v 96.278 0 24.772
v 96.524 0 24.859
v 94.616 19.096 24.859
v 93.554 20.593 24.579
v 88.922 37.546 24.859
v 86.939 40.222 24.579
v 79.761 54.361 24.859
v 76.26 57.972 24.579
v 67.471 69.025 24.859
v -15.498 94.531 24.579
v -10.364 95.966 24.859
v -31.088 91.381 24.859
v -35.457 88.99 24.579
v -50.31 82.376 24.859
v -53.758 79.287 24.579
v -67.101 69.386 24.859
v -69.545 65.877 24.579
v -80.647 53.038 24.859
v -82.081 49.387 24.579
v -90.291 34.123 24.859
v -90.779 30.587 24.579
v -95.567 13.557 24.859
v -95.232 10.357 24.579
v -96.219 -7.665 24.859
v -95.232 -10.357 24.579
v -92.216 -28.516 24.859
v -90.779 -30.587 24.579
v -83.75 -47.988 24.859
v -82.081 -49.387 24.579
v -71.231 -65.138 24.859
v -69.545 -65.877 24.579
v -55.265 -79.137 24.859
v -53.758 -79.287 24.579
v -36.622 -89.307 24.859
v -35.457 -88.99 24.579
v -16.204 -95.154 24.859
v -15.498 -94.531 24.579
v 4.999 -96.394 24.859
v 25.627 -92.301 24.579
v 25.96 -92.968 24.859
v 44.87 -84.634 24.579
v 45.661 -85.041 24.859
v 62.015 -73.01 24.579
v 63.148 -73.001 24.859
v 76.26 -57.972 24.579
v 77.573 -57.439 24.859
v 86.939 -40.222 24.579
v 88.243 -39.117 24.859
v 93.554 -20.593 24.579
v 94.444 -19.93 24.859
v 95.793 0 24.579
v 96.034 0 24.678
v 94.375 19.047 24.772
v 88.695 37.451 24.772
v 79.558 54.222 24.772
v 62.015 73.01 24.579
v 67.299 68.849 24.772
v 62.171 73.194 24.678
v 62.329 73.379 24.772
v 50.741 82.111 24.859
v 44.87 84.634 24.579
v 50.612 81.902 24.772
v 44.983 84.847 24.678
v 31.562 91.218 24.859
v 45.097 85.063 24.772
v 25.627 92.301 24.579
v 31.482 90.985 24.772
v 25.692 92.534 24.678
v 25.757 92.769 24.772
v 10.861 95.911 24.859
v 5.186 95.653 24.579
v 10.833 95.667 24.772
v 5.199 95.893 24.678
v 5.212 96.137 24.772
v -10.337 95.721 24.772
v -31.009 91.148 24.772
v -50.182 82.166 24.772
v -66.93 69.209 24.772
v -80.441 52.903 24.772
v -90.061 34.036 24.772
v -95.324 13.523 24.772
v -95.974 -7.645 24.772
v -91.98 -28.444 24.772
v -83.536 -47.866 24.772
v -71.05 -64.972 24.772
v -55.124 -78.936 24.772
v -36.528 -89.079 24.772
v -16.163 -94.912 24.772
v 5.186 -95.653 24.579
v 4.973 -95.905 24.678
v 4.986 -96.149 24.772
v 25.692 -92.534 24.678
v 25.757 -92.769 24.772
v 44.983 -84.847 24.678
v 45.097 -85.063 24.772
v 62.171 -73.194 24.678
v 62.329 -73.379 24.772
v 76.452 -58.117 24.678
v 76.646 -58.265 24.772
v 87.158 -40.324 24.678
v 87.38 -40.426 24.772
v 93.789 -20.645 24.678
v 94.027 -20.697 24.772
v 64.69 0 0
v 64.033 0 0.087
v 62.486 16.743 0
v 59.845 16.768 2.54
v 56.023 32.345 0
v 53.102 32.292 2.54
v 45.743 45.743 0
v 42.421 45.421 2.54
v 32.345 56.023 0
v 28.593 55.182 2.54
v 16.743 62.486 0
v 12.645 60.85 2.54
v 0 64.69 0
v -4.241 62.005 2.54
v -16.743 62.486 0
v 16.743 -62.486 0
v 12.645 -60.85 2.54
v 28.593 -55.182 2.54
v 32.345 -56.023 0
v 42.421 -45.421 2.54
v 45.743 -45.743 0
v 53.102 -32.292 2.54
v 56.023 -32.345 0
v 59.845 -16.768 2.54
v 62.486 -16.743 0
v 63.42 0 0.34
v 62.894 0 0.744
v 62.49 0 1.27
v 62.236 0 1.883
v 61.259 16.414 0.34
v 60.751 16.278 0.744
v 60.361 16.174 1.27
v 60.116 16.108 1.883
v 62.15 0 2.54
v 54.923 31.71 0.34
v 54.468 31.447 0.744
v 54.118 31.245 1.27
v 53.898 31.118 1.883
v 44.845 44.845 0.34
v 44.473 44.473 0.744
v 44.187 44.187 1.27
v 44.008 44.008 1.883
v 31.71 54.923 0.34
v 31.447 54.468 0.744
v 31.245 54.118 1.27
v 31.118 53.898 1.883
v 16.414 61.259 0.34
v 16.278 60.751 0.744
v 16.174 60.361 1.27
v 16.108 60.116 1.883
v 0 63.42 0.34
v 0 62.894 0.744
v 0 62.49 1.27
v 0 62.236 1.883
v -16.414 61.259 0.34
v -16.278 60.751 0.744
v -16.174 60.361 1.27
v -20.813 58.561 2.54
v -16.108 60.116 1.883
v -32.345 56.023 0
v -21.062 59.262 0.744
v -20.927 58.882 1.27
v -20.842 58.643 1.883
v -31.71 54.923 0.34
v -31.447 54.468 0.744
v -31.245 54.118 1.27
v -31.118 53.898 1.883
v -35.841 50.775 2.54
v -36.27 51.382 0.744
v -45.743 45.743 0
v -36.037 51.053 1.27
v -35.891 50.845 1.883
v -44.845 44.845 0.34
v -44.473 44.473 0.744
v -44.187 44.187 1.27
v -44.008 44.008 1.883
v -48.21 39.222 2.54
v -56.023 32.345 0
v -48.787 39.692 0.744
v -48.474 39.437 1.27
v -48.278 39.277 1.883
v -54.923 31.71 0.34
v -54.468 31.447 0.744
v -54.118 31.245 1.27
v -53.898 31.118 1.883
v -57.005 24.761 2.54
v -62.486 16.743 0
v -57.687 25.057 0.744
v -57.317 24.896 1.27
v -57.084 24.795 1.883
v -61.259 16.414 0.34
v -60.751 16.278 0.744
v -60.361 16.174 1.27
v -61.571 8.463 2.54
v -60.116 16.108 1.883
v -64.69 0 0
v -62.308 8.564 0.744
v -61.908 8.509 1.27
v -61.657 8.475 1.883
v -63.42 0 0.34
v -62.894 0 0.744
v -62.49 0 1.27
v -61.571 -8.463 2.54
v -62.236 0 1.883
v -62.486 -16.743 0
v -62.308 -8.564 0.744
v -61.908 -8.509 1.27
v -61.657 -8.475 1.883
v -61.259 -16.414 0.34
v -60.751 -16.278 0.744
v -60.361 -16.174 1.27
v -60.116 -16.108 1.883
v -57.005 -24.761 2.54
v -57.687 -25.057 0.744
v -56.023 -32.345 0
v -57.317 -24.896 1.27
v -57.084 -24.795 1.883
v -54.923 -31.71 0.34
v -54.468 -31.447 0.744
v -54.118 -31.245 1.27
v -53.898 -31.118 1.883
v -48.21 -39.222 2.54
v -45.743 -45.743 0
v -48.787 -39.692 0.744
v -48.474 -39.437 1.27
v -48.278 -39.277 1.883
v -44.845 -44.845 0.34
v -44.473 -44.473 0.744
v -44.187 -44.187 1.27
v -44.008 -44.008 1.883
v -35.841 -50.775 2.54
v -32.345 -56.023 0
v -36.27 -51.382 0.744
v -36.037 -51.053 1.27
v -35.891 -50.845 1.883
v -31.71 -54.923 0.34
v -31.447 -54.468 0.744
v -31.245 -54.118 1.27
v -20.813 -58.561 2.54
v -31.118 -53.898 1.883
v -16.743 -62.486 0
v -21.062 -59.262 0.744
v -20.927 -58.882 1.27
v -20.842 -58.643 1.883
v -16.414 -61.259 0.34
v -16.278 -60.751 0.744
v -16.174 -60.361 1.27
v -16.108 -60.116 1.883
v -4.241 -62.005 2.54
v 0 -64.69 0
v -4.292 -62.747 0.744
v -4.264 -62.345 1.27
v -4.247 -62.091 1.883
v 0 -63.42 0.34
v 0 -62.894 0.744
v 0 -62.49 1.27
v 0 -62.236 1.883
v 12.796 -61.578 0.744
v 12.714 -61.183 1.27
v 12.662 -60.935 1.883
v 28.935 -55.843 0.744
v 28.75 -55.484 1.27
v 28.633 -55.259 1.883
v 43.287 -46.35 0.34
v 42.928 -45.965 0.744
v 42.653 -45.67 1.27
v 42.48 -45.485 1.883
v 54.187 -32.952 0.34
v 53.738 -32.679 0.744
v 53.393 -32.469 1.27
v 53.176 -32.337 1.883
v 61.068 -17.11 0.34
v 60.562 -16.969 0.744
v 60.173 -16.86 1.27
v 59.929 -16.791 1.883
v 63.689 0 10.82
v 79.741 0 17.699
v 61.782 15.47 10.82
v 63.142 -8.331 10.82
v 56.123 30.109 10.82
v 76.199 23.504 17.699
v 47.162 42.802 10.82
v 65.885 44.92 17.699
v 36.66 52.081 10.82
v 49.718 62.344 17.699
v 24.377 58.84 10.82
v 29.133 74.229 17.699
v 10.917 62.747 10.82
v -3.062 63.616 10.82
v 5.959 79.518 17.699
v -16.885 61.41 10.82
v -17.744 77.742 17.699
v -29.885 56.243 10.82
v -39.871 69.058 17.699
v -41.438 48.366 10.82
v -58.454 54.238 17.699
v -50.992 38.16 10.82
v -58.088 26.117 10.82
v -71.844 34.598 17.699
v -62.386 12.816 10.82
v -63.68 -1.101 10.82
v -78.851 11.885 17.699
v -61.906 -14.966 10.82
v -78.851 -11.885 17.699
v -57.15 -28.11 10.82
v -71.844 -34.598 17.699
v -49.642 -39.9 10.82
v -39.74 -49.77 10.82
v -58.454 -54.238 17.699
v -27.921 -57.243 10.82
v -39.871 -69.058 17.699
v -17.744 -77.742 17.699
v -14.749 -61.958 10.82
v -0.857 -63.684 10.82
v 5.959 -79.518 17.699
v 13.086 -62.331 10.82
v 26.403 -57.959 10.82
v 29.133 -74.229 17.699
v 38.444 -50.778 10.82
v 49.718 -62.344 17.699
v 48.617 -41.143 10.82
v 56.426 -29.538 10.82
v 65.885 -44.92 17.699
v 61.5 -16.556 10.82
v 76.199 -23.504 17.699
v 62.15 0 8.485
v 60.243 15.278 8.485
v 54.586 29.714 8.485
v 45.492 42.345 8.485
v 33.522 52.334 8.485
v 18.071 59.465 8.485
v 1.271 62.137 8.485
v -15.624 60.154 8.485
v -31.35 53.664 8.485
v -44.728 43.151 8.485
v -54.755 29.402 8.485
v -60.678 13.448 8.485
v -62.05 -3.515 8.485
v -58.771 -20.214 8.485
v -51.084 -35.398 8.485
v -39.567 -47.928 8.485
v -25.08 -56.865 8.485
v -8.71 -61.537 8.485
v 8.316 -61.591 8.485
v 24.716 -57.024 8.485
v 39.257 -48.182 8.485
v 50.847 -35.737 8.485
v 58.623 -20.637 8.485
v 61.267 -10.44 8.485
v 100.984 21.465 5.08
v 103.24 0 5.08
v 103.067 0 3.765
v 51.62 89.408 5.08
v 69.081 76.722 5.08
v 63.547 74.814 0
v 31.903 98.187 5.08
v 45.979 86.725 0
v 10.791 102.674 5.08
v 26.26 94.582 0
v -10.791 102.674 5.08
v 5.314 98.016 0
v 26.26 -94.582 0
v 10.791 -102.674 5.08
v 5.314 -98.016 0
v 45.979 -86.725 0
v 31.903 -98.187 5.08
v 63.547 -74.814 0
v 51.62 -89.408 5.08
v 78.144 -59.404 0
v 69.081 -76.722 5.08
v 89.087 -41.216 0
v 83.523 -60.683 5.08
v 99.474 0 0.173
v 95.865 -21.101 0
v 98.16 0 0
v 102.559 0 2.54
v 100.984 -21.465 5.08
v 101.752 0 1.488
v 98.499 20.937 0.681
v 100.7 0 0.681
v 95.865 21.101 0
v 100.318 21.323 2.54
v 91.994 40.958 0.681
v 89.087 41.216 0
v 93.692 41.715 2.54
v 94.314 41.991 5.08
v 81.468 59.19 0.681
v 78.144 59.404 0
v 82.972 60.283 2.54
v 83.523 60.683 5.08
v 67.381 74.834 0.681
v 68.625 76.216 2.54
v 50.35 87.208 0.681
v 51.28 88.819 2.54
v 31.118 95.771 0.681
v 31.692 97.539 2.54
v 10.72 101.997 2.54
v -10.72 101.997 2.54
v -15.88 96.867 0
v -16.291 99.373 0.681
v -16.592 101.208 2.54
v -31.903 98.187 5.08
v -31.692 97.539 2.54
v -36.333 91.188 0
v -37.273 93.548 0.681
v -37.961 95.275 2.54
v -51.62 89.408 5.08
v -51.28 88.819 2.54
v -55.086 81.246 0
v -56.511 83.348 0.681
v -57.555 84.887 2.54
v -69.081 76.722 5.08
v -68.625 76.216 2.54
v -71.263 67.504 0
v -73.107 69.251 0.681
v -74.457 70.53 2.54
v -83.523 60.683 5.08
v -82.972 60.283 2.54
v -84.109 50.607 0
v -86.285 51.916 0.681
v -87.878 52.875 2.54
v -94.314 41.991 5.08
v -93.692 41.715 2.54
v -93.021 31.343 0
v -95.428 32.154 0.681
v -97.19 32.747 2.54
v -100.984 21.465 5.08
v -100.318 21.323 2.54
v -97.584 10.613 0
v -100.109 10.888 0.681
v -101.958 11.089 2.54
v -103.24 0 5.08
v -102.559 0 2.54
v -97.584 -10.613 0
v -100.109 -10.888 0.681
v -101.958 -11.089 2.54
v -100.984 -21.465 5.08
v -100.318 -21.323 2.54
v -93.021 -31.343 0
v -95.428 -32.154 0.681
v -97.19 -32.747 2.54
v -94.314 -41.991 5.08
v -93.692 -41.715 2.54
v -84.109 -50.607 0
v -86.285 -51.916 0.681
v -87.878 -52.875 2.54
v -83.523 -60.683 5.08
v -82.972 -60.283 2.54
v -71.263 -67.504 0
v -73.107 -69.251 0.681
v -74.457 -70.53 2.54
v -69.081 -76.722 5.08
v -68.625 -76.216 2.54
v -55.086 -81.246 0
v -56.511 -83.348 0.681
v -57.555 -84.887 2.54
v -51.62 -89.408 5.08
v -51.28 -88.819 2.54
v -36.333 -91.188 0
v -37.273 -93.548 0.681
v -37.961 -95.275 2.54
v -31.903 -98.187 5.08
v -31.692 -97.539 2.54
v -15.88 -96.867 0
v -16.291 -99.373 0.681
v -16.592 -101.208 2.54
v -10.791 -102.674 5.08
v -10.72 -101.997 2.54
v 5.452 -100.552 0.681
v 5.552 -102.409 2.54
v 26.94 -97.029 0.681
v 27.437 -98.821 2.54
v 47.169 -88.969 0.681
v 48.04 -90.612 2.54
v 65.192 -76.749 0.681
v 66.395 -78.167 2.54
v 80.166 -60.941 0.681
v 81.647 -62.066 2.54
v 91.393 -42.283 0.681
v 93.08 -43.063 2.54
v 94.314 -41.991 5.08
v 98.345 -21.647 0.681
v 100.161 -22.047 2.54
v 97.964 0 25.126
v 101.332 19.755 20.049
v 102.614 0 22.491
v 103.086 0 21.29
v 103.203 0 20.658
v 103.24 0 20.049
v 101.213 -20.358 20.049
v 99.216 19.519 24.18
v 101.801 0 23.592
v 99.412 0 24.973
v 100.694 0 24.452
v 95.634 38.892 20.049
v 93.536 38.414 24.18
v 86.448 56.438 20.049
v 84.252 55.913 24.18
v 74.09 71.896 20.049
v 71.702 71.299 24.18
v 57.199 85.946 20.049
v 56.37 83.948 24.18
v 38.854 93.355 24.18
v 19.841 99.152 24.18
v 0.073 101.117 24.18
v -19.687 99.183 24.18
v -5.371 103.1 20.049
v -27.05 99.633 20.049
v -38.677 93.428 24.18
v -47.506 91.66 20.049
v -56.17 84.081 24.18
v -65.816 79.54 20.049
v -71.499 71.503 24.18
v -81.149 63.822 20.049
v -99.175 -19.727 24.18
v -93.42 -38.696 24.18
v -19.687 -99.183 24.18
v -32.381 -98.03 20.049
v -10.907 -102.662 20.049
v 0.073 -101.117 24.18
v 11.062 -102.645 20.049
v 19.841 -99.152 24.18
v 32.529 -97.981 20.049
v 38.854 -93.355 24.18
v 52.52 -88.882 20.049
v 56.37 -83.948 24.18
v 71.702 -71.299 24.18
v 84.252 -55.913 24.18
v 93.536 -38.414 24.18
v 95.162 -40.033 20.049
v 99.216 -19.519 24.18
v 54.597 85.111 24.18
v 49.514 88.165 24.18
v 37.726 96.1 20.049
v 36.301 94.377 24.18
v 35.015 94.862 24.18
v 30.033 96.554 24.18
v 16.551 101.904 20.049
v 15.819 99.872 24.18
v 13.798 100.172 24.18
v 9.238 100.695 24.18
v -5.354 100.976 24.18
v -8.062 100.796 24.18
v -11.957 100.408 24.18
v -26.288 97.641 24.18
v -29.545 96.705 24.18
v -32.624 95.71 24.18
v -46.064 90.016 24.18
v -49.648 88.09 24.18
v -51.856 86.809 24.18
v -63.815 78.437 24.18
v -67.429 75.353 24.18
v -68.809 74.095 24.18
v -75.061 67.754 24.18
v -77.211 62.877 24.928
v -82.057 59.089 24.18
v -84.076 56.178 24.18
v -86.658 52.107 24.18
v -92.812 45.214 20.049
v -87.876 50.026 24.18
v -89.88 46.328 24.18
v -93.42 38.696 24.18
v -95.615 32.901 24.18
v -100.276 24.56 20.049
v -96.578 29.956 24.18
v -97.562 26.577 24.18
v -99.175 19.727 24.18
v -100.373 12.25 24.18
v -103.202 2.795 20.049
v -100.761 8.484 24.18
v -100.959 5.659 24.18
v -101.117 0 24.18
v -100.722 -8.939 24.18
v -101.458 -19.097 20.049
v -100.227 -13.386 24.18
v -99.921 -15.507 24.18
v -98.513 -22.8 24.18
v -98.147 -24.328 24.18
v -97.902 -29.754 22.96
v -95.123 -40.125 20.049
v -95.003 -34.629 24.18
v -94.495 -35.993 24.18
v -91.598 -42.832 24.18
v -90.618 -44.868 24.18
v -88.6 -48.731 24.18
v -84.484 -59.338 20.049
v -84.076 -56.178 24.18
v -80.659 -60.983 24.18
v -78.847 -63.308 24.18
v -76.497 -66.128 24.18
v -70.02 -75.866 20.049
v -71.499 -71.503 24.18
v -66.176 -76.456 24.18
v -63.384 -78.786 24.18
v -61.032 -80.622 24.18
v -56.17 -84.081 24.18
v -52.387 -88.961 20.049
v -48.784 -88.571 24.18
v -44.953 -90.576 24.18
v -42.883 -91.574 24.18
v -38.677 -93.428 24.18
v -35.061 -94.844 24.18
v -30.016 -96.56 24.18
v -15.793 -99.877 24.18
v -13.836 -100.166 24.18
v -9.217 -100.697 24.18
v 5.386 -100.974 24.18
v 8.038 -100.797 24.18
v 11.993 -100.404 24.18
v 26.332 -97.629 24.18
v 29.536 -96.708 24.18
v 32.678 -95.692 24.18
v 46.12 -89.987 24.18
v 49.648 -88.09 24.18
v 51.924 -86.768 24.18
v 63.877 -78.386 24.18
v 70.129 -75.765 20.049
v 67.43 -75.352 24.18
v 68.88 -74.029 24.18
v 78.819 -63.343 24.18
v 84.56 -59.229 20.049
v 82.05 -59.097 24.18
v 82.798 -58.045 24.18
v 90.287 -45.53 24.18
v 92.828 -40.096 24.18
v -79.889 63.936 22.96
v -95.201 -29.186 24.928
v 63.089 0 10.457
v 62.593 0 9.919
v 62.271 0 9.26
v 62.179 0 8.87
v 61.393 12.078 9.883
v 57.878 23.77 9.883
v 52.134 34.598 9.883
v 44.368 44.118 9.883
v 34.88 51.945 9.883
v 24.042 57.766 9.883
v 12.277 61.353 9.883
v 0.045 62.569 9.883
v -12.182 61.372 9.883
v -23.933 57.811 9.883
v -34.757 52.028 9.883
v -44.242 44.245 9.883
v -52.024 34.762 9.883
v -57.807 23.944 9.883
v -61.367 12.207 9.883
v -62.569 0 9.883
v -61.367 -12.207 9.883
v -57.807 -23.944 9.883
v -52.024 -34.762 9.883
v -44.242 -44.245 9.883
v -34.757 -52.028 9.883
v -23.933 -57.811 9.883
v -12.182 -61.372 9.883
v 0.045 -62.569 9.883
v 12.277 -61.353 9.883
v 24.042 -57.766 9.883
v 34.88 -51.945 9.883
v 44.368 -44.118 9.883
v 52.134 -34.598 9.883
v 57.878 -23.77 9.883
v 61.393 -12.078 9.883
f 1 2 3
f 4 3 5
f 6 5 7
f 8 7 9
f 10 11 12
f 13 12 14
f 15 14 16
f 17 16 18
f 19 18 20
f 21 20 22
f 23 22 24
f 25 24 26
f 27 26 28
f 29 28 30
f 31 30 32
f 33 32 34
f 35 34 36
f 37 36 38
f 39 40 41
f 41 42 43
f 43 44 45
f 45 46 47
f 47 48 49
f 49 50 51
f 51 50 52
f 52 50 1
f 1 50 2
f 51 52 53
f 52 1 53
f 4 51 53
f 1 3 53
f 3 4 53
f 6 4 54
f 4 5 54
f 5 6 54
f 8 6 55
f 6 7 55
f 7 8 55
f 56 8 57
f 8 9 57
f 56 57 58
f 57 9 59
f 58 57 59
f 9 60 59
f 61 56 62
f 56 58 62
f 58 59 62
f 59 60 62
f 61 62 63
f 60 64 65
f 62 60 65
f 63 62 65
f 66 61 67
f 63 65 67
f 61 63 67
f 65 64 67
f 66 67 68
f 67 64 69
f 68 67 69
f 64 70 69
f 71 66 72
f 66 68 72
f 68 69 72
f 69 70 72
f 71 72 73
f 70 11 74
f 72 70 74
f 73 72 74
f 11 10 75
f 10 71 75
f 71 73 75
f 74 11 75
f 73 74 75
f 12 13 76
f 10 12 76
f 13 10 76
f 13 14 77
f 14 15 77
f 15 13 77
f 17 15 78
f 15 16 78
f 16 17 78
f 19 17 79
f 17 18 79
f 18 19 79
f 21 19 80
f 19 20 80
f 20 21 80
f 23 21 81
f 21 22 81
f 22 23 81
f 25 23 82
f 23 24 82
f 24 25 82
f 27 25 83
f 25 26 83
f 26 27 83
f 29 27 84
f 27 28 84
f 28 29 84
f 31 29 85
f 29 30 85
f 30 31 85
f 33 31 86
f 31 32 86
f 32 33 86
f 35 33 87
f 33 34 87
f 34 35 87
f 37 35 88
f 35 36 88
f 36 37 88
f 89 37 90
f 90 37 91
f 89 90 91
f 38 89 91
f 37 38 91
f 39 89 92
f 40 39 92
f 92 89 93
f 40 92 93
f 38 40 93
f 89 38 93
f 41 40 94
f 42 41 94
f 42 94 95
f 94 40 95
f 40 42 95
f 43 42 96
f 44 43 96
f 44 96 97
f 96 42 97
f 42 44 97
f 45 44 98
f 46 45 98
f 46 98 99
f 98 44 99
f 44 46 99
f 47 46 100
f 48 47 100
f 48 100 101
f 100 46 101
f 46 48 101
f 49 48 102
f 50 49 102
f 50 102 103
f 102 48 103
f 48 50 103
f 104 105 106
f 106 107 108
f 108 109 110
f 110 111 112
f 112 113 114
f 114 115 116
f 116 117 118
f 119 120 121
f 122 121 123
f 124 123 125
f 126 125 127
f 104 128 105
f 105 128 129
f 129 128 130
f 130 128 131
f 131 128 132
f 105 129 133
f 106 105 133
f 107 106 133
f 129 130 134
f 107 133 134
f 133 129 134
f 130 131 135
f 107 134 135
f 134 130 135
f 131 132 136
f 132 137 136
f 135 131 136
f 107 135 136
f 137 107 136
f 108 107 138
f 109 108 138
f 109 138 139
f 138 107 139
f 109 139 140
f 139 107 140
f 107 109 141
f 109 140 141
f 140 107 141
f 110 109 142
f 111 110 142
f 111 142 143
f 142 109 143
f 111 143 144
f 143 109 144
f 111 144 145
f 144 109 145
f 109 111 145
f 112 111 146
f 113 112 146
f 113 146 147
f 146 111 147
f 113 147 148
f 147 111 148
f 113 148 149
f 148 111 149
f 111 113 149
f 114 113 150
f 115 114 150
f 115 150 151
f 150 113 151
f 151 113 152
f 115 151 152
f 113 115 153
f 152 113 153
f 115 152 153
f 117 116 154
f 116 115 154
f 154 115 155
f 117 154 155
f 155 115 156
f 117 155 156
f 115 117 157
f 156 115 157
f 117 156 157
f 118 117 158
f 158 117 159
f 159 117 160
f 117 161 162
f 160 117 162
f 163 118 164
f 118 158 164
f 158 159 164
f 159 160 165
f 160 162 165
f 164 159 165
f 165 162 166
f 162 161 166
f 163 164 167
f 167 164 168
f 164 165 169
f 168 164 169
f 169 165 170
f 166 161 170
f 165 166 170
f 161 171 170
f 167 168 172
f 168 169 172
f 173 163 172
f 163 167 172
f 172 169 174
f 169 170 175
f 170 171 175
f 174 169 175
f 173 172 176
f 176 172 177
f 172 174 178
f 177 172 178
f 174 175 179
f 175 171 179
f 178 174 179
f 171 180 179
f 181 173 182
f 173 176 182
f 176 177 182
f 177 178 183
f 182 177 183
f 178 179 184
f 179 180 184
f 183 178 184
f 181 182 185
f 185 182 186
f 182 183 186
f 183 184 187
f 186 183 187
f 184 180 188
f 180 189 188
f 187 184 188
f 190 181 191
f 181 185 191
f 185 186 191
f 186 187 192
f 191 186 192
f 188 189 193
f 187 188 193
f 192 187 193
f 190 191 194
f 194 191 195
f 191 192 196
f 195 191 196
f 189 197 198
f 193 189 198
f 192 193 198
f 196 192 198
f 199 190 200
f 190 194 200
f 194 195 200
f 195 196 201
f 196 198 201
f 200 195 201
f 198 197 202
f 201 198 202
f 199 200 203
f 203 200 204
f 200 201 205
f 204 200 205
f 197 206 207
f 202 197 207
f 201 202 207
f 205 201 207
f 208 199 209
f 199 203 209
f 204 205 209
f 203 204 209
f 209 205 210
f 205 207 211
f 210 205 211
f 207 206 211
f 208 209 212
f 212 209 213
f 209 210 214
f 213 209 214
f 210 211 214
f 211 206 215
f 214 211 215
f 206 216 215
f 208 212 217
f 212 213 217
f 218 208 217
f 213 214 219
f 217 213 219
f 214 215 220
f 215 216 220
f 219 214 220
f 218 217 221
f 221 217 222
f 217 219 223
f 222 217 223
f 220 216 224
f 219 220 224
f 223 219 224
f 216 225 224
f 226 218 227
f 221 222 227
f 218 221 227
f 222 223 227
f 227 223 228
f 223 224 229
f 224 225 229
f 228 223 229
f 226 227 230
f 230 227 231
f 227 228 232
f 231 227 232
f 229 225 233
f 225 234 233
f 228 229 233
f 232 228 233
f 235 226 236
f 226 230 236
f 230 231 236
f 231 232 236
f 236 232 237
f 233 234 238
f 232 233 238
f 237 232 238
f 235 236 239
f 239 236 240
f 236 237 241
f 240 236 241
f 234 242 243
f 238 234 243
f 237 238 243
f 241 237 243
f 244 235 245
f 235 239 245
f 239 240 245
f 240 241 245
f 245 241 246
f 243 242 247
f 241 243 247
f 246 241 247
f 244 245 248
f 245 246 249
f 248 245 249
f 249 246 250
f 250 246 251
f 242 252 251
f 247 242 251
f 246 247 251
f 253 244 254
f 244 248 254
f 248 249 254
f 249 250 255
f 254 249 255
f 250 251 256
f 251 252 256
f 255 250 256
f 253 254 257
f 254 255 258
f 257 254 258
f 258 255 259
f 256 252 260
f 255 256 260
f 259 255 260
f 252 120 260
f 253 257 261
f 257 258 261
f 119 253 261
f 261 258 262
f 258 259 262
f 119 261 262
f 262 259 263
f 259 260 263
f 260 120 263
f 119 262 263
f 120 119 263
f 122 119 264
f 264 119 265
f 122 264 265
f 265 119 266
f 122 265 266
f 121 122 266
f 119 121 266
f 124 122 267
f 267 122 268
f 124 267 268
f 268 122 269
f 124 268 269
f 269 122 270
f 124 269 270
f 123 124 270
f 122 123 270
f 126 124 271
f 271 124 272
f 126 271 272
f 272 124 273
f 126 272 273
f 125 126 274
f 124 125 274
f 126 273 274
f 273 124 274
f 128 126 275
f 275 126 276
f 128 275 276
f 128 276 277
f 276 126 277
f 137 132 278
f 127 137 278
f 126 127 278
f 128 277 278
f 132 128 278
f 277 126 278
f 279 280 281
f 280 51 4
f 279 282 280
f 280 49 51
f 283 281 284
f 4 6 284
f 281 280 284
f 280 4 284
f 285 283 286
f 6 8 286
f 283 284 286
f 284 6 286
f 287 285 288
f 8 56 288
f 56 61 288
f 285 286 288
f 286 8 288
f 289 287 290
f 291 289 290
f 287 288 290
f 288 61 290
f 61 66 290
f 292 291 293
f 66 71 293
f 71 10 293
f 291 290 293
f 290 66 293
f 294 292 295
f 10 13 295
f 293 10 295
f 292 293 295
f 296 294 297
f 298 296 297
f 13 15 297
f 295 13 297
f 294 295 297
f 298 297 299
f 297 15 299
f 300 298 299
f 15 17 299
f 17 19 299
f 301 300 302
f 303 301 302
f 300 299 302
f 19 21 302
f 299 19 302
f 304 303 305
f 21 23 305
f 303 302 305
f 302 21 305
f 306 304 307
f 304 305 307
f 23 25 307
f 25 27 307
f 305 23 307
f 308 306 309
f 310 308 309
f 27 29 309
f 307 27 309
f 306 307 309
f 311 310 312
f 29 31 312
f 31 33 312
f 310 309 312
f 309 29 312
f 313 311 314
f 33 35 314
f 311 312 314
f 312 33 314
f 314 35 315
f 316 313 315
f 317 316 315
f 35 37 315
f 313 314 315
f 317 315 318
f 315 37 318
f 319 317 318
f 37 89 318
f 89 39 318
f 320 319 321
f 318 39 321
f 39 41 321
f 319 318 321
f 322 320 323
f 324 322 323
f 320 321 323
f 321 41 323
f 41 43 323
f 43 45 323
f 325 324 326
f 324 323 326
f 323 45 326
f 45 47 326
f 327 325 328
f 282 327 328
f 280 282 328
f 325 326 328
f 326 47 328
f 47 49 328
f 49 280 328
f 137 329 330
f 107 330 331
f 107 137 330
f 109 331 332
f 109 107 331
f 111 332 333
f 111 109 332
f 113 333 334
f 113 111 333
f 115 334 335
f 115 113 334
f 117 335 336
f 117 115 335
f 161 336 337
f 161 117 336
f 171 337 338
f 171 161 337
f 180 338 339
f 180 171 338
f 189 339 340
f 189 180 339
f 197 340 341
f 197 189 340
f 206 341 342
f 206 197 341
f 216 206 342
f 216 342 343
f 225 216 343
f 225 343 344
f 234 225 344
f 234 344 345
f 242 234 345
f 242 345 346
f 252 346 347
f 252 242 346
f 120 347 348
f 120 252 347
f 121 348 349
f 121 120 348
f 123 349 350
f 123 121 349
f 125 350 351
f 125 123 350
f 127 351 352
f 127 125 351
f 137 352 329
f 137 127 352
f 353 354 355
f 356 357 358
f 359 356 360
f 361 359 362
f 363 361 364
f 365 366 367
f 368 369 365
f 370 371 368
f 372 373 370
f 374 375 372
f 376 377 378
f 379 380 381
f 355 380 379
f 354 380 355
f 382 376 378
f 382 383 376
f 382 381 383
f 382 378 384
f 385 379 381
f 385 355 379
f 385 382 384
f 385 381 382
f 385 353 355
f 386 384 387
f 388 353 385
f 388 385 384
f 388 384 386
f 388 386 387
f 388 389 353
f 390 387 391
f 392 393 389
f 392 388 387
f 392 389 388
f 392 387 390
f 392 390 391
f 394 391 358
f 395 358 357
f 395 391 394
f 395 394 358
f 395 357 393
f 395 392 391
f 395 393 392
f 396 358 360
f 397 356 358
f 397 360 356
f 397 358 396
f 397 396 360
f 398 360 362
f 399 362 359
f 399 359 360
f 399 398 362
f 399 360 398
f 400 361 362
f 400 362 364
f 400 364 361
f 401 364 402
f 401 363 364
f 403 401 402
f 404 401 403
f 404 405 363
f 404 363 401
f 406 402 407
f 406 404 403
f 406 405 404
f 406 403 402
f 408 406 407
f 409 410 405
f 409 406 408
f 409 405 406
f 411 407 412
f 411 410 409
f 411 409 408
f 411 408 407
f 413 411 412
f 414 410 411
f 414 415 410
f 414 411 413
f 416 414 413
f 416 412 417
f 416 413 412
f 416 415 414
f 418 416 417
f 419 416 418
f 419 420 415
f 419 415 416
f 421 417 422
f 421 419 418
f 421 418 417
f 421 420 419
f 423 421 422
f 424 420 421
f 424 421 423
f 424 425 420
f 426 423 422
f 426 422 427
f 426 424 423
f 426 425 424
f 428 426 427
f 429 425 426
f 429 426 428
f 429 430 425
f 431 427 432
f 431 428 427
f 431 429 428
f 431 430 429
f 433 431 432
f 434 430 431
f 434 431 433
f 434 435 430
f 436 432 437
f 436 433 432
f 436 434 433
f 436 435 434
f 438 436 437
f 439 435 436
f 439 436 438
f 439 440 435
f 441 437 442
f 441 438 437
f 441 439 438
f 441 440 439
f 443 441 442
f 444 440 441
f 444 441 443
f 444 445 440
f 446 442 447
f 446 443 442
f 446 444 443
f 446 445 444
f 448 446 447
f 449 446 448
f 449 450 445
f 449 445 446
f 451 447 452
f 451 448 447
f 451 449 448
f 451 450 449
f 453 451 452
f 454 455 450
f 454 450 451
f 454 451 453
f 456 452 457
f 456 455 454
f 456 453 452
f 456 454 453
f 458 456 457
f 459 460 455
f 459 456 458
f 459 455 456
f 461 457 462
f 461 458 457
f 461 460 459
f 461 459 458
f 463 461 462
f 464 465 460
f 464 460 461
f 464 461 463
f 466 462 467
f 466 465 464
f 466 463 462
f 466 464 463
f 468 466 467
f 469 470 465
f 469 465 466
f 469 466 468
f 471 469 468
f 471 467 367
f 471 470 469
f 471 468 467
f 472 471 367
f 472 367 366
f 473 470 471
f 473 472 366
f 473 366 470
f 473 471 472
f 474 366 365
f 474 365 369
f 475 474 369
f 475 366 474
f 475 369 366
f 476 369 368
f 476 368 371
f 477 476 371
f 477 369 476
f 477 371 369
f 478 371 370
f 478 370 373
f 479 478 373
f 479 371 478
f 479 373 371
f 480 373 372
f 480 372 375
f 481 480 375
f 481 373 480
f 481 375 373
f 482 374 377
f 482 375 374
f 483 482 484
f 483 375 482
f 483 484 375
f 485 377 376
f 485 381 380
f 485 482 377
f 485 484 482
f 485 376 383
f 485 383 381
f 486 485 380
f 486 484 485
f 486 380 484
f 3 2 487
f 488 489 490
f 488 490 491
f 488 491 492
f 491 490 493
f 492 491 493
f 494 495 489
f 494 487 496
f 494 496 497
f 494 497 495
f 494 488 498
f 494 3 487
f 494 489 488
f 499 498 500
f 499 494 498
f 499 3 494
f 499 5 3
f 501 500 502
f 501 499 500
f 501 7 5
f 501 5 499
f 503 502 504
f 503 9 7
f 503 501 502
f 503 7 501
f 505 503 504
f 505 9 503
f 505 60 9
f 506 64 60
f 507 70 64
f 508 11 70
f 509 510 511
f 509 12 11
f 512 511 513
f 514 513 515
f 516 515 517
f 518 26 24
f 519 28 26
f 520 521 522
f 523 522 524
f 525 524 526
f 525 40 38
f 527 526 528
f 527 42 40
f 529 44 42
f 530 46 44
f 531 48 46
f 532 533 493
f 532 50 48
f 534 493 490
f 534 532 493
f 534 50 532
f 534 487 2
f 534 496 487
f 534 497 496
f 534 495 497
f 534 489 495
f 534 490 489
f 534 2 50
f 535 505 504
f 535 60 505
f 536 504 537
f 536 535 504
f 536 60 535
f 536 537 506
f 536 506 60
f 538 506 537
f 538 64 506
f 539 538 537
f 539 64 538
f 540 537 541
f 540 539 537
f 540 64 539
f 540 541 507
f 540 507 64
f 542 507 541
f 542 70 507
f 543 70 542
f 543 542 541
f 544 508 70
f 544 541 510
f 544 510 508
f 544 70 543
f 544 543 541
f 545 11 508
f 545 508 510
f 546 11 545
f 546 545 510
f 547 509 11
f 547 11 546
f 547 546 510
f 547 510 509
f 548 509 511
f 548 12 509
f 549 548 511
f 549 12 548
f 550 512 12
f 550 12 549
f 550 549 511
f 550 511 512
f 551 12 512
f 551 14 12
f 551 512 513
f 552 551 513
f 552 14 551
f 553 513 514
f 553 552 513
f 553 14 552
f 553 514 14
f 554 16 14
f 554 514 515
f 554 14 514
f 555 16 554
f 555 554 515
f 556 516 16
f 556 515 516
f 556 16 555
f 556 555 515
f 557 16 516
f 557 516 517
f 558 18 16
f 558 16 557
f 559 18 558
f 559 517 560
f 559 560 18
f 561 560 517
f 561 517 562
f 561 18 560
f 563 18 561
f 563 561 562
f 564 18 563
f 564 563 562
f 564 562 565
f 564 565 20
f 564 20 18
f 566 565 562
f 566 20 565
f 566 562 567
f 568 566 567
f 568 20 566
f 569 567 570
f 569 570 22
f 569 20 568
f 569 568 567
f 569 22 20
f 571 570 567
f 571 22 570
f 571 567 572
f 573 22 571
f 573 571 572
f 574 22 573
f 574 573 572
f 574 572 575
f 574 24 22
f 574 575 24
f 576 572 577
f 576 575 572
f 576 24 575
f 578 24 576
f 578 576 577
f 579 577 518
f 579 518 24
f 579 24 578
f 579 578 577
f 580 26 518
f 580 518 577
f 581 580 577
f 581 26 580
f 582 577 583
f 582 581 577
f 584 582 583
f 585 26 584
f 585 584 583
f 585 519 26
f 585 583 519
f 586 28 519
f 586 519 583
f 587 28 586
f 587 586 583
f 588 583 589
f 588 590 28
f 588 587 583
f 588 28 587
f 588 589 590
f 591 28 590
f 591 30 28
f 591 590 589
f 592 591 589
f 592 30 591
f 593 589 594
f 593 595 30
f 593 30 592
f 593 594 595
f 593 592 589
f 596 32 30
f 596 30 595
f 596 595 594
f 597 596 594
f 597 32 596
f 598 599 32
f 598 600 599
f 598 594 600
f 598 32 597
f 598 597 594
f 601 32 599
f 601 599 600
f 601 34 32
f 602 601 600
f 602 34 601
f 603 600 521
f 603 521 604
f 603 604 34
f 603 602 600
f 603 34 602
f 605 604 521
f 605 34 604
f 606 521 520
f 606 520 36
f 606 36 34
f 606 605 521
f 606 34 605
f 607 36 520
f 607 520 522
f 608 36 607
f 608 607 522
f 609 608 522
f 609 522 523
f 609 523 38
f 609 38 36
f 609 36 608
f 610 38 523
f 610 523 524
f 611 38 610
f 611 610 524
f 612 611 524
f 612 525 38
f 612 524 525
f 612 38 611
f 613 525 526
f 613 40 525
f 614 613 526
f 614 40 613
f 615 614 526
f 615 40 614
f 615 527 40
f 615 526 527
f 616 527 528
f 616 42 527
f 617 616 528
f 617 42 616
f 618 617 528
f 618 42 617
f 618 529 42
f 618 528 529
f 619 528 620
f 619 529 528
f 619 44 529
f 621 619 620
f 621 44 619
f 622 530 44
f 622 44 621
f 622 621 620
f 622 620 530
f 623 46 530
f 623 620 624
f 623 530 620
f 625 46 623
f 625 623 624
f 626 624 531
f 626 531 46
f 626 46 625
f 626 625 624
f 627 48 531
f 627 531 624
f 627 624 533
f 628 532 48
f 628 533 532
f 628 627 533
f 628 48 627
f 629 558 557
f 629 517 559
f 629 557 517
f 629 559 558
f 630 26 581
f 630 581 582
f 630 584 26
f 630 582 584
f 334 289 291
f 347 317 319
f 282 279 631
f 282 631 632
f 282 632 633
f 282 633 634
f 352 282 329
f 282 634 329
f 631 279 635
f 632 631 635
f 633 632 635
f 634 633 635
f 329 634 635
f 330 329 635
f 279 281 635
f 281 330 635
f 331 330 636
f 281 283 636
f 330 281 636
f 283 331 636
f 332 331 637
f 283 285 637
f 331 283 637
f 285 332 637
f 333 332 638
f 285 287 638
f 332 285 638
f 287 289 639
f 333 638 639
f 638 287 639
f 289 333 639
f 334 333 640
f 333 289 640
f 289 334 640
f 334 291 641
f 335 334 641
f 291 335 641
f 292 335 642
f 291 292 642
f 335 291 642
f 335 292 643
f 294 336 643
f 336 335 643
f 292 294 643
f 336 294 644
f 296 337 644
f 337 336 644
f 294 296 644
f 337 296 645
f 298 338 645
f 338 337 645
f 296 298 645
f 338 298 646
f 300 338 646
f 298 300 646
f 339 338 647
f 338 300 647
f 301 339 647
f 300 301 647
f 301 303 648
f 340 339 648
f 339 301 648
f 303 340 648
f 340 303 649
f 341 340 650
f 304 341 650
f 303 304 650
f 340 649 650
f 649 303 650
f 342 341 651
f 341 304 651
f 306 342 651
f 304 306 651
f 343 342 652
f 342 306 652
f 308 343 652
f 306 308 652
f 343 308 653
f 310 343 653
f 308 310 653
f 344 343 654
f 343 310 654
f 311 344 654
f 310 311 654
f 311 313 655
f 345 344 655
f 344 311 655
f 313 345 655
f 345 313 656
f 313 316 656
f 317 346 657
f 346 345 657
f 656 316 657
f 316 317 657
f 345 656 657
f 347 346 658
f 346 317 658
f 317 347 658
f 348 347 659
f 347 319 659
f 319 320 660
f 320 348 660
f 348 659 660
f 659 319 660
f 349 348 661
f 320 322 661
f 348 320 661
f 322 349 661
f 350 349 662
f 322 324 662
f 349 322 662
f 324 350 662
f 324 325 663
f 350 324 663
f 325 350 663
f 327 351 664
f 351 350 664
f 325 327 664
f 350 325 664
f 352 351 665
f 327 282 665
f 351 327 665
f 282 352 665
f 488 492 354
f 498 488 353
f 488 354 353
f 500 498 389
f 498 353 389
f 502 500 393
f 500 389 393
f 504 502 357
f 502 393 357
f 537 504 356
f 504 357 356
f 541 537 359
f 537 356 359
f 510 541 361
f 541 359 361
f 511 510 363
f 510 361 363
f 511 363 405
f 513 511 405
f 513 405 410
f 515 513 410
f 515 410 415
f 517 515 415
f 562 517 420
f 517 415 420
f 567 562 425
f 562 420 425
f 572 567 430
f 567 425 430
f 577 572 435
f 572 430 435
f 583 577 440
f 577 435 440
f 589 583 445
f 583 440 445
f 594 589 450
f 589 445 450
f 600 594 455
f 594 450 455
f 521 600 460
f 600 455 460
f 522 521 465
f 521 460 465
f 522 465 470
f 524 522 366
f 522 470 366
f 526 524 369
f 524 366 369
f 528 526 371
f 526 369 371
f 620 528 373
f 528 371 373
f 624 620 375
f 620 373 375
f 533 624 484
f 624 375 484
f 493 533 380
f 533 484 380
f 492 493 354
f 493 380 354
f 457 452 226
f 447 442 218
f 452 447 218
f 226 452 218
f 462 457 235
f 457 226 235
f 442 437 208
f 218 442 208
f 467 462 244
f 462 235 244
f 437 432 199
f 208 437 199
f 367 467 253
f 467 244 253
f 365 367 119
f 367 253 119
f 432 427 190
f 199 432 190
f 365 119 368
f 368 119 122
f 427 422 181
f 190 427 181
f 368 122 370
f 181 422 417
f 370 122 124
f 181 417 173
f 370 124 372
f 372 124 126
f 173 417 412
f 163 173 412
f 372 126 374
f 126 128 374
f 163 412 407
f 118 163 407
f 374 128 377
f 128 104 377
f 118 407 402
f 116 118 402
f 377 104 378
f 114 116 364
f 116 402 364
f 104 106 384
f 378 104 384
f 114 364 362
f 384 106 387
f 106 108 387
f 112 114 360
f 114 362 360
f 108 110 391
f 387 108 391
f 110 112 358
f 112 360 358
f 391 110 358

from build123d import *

# Parameters (mm, degrees)
F0_R     = 103.2396563961
F0_R_2   = 62.1499238645
F1_DEPTH = 25.4
F2_SIZE2 = 35.56
F2_SIZE  = 15.24
F3_R     = 10.16
F4_R     = 5.08
F5_R     = 2.54
F6_R     = 5.08
F7_R     = 2.54


with BuildPart() as f1:
    # F0 (on Top) → F1 (new body)
    with BuildSketch(Plane.XY):
        Circle(F0_R)
        Circle(F0_R_2, mode=Mode.SUBTRACT)
    extrude(amount=F1_DEPTH)

    # F2
    f2_edges = [f1.edges().sort_by_distance(p)[0] for p in [
        (-62.149924, 0, 25.4),
    ]]
    f2_side = f1.faces().sort_by_distance((-62.149924, 0, 12.7))[0]
    chamfer(f2_edges, length=F2_SIZE, length2=F2_SIZE2, reference=f2_side)

    # F3
    f3_edges = [f1.edges().sort_by_distance(p)[0] for p in [
        (-97.709924, 0, 25.4),
    ]]
    fillet(f3_edges, radius=F3_R)

    # F4
    f4_edges = [f1.edges().sort_by_distance(p)[0] for p in [
        (-103.239656, 0, 25.4),
    ]]
    fillet(f4_edges, radius=F4_R)

    # F5
    f5_edges = [f1.edges().sort_by_distance(p)[0] for p in [
        (-62.149924, 0, 10.16),
    ]]
    fillet(f5_edges, radius=F5_R)

    # F6
    f6_edges = [f1.edges().sort_by_distance(p)[0] for p in [
        (-103.239656, 0, 0),
    ]]
    fillet(f6_edges, radius=F6_R)

    # F7
    f7_edges = [f1.edges().sort_by_distance(p)[0] for p in [
        (-62.149924, 0, 0),
    ]]
    fillet(f7_edges, radius=F7_R)


solid = f1.part
